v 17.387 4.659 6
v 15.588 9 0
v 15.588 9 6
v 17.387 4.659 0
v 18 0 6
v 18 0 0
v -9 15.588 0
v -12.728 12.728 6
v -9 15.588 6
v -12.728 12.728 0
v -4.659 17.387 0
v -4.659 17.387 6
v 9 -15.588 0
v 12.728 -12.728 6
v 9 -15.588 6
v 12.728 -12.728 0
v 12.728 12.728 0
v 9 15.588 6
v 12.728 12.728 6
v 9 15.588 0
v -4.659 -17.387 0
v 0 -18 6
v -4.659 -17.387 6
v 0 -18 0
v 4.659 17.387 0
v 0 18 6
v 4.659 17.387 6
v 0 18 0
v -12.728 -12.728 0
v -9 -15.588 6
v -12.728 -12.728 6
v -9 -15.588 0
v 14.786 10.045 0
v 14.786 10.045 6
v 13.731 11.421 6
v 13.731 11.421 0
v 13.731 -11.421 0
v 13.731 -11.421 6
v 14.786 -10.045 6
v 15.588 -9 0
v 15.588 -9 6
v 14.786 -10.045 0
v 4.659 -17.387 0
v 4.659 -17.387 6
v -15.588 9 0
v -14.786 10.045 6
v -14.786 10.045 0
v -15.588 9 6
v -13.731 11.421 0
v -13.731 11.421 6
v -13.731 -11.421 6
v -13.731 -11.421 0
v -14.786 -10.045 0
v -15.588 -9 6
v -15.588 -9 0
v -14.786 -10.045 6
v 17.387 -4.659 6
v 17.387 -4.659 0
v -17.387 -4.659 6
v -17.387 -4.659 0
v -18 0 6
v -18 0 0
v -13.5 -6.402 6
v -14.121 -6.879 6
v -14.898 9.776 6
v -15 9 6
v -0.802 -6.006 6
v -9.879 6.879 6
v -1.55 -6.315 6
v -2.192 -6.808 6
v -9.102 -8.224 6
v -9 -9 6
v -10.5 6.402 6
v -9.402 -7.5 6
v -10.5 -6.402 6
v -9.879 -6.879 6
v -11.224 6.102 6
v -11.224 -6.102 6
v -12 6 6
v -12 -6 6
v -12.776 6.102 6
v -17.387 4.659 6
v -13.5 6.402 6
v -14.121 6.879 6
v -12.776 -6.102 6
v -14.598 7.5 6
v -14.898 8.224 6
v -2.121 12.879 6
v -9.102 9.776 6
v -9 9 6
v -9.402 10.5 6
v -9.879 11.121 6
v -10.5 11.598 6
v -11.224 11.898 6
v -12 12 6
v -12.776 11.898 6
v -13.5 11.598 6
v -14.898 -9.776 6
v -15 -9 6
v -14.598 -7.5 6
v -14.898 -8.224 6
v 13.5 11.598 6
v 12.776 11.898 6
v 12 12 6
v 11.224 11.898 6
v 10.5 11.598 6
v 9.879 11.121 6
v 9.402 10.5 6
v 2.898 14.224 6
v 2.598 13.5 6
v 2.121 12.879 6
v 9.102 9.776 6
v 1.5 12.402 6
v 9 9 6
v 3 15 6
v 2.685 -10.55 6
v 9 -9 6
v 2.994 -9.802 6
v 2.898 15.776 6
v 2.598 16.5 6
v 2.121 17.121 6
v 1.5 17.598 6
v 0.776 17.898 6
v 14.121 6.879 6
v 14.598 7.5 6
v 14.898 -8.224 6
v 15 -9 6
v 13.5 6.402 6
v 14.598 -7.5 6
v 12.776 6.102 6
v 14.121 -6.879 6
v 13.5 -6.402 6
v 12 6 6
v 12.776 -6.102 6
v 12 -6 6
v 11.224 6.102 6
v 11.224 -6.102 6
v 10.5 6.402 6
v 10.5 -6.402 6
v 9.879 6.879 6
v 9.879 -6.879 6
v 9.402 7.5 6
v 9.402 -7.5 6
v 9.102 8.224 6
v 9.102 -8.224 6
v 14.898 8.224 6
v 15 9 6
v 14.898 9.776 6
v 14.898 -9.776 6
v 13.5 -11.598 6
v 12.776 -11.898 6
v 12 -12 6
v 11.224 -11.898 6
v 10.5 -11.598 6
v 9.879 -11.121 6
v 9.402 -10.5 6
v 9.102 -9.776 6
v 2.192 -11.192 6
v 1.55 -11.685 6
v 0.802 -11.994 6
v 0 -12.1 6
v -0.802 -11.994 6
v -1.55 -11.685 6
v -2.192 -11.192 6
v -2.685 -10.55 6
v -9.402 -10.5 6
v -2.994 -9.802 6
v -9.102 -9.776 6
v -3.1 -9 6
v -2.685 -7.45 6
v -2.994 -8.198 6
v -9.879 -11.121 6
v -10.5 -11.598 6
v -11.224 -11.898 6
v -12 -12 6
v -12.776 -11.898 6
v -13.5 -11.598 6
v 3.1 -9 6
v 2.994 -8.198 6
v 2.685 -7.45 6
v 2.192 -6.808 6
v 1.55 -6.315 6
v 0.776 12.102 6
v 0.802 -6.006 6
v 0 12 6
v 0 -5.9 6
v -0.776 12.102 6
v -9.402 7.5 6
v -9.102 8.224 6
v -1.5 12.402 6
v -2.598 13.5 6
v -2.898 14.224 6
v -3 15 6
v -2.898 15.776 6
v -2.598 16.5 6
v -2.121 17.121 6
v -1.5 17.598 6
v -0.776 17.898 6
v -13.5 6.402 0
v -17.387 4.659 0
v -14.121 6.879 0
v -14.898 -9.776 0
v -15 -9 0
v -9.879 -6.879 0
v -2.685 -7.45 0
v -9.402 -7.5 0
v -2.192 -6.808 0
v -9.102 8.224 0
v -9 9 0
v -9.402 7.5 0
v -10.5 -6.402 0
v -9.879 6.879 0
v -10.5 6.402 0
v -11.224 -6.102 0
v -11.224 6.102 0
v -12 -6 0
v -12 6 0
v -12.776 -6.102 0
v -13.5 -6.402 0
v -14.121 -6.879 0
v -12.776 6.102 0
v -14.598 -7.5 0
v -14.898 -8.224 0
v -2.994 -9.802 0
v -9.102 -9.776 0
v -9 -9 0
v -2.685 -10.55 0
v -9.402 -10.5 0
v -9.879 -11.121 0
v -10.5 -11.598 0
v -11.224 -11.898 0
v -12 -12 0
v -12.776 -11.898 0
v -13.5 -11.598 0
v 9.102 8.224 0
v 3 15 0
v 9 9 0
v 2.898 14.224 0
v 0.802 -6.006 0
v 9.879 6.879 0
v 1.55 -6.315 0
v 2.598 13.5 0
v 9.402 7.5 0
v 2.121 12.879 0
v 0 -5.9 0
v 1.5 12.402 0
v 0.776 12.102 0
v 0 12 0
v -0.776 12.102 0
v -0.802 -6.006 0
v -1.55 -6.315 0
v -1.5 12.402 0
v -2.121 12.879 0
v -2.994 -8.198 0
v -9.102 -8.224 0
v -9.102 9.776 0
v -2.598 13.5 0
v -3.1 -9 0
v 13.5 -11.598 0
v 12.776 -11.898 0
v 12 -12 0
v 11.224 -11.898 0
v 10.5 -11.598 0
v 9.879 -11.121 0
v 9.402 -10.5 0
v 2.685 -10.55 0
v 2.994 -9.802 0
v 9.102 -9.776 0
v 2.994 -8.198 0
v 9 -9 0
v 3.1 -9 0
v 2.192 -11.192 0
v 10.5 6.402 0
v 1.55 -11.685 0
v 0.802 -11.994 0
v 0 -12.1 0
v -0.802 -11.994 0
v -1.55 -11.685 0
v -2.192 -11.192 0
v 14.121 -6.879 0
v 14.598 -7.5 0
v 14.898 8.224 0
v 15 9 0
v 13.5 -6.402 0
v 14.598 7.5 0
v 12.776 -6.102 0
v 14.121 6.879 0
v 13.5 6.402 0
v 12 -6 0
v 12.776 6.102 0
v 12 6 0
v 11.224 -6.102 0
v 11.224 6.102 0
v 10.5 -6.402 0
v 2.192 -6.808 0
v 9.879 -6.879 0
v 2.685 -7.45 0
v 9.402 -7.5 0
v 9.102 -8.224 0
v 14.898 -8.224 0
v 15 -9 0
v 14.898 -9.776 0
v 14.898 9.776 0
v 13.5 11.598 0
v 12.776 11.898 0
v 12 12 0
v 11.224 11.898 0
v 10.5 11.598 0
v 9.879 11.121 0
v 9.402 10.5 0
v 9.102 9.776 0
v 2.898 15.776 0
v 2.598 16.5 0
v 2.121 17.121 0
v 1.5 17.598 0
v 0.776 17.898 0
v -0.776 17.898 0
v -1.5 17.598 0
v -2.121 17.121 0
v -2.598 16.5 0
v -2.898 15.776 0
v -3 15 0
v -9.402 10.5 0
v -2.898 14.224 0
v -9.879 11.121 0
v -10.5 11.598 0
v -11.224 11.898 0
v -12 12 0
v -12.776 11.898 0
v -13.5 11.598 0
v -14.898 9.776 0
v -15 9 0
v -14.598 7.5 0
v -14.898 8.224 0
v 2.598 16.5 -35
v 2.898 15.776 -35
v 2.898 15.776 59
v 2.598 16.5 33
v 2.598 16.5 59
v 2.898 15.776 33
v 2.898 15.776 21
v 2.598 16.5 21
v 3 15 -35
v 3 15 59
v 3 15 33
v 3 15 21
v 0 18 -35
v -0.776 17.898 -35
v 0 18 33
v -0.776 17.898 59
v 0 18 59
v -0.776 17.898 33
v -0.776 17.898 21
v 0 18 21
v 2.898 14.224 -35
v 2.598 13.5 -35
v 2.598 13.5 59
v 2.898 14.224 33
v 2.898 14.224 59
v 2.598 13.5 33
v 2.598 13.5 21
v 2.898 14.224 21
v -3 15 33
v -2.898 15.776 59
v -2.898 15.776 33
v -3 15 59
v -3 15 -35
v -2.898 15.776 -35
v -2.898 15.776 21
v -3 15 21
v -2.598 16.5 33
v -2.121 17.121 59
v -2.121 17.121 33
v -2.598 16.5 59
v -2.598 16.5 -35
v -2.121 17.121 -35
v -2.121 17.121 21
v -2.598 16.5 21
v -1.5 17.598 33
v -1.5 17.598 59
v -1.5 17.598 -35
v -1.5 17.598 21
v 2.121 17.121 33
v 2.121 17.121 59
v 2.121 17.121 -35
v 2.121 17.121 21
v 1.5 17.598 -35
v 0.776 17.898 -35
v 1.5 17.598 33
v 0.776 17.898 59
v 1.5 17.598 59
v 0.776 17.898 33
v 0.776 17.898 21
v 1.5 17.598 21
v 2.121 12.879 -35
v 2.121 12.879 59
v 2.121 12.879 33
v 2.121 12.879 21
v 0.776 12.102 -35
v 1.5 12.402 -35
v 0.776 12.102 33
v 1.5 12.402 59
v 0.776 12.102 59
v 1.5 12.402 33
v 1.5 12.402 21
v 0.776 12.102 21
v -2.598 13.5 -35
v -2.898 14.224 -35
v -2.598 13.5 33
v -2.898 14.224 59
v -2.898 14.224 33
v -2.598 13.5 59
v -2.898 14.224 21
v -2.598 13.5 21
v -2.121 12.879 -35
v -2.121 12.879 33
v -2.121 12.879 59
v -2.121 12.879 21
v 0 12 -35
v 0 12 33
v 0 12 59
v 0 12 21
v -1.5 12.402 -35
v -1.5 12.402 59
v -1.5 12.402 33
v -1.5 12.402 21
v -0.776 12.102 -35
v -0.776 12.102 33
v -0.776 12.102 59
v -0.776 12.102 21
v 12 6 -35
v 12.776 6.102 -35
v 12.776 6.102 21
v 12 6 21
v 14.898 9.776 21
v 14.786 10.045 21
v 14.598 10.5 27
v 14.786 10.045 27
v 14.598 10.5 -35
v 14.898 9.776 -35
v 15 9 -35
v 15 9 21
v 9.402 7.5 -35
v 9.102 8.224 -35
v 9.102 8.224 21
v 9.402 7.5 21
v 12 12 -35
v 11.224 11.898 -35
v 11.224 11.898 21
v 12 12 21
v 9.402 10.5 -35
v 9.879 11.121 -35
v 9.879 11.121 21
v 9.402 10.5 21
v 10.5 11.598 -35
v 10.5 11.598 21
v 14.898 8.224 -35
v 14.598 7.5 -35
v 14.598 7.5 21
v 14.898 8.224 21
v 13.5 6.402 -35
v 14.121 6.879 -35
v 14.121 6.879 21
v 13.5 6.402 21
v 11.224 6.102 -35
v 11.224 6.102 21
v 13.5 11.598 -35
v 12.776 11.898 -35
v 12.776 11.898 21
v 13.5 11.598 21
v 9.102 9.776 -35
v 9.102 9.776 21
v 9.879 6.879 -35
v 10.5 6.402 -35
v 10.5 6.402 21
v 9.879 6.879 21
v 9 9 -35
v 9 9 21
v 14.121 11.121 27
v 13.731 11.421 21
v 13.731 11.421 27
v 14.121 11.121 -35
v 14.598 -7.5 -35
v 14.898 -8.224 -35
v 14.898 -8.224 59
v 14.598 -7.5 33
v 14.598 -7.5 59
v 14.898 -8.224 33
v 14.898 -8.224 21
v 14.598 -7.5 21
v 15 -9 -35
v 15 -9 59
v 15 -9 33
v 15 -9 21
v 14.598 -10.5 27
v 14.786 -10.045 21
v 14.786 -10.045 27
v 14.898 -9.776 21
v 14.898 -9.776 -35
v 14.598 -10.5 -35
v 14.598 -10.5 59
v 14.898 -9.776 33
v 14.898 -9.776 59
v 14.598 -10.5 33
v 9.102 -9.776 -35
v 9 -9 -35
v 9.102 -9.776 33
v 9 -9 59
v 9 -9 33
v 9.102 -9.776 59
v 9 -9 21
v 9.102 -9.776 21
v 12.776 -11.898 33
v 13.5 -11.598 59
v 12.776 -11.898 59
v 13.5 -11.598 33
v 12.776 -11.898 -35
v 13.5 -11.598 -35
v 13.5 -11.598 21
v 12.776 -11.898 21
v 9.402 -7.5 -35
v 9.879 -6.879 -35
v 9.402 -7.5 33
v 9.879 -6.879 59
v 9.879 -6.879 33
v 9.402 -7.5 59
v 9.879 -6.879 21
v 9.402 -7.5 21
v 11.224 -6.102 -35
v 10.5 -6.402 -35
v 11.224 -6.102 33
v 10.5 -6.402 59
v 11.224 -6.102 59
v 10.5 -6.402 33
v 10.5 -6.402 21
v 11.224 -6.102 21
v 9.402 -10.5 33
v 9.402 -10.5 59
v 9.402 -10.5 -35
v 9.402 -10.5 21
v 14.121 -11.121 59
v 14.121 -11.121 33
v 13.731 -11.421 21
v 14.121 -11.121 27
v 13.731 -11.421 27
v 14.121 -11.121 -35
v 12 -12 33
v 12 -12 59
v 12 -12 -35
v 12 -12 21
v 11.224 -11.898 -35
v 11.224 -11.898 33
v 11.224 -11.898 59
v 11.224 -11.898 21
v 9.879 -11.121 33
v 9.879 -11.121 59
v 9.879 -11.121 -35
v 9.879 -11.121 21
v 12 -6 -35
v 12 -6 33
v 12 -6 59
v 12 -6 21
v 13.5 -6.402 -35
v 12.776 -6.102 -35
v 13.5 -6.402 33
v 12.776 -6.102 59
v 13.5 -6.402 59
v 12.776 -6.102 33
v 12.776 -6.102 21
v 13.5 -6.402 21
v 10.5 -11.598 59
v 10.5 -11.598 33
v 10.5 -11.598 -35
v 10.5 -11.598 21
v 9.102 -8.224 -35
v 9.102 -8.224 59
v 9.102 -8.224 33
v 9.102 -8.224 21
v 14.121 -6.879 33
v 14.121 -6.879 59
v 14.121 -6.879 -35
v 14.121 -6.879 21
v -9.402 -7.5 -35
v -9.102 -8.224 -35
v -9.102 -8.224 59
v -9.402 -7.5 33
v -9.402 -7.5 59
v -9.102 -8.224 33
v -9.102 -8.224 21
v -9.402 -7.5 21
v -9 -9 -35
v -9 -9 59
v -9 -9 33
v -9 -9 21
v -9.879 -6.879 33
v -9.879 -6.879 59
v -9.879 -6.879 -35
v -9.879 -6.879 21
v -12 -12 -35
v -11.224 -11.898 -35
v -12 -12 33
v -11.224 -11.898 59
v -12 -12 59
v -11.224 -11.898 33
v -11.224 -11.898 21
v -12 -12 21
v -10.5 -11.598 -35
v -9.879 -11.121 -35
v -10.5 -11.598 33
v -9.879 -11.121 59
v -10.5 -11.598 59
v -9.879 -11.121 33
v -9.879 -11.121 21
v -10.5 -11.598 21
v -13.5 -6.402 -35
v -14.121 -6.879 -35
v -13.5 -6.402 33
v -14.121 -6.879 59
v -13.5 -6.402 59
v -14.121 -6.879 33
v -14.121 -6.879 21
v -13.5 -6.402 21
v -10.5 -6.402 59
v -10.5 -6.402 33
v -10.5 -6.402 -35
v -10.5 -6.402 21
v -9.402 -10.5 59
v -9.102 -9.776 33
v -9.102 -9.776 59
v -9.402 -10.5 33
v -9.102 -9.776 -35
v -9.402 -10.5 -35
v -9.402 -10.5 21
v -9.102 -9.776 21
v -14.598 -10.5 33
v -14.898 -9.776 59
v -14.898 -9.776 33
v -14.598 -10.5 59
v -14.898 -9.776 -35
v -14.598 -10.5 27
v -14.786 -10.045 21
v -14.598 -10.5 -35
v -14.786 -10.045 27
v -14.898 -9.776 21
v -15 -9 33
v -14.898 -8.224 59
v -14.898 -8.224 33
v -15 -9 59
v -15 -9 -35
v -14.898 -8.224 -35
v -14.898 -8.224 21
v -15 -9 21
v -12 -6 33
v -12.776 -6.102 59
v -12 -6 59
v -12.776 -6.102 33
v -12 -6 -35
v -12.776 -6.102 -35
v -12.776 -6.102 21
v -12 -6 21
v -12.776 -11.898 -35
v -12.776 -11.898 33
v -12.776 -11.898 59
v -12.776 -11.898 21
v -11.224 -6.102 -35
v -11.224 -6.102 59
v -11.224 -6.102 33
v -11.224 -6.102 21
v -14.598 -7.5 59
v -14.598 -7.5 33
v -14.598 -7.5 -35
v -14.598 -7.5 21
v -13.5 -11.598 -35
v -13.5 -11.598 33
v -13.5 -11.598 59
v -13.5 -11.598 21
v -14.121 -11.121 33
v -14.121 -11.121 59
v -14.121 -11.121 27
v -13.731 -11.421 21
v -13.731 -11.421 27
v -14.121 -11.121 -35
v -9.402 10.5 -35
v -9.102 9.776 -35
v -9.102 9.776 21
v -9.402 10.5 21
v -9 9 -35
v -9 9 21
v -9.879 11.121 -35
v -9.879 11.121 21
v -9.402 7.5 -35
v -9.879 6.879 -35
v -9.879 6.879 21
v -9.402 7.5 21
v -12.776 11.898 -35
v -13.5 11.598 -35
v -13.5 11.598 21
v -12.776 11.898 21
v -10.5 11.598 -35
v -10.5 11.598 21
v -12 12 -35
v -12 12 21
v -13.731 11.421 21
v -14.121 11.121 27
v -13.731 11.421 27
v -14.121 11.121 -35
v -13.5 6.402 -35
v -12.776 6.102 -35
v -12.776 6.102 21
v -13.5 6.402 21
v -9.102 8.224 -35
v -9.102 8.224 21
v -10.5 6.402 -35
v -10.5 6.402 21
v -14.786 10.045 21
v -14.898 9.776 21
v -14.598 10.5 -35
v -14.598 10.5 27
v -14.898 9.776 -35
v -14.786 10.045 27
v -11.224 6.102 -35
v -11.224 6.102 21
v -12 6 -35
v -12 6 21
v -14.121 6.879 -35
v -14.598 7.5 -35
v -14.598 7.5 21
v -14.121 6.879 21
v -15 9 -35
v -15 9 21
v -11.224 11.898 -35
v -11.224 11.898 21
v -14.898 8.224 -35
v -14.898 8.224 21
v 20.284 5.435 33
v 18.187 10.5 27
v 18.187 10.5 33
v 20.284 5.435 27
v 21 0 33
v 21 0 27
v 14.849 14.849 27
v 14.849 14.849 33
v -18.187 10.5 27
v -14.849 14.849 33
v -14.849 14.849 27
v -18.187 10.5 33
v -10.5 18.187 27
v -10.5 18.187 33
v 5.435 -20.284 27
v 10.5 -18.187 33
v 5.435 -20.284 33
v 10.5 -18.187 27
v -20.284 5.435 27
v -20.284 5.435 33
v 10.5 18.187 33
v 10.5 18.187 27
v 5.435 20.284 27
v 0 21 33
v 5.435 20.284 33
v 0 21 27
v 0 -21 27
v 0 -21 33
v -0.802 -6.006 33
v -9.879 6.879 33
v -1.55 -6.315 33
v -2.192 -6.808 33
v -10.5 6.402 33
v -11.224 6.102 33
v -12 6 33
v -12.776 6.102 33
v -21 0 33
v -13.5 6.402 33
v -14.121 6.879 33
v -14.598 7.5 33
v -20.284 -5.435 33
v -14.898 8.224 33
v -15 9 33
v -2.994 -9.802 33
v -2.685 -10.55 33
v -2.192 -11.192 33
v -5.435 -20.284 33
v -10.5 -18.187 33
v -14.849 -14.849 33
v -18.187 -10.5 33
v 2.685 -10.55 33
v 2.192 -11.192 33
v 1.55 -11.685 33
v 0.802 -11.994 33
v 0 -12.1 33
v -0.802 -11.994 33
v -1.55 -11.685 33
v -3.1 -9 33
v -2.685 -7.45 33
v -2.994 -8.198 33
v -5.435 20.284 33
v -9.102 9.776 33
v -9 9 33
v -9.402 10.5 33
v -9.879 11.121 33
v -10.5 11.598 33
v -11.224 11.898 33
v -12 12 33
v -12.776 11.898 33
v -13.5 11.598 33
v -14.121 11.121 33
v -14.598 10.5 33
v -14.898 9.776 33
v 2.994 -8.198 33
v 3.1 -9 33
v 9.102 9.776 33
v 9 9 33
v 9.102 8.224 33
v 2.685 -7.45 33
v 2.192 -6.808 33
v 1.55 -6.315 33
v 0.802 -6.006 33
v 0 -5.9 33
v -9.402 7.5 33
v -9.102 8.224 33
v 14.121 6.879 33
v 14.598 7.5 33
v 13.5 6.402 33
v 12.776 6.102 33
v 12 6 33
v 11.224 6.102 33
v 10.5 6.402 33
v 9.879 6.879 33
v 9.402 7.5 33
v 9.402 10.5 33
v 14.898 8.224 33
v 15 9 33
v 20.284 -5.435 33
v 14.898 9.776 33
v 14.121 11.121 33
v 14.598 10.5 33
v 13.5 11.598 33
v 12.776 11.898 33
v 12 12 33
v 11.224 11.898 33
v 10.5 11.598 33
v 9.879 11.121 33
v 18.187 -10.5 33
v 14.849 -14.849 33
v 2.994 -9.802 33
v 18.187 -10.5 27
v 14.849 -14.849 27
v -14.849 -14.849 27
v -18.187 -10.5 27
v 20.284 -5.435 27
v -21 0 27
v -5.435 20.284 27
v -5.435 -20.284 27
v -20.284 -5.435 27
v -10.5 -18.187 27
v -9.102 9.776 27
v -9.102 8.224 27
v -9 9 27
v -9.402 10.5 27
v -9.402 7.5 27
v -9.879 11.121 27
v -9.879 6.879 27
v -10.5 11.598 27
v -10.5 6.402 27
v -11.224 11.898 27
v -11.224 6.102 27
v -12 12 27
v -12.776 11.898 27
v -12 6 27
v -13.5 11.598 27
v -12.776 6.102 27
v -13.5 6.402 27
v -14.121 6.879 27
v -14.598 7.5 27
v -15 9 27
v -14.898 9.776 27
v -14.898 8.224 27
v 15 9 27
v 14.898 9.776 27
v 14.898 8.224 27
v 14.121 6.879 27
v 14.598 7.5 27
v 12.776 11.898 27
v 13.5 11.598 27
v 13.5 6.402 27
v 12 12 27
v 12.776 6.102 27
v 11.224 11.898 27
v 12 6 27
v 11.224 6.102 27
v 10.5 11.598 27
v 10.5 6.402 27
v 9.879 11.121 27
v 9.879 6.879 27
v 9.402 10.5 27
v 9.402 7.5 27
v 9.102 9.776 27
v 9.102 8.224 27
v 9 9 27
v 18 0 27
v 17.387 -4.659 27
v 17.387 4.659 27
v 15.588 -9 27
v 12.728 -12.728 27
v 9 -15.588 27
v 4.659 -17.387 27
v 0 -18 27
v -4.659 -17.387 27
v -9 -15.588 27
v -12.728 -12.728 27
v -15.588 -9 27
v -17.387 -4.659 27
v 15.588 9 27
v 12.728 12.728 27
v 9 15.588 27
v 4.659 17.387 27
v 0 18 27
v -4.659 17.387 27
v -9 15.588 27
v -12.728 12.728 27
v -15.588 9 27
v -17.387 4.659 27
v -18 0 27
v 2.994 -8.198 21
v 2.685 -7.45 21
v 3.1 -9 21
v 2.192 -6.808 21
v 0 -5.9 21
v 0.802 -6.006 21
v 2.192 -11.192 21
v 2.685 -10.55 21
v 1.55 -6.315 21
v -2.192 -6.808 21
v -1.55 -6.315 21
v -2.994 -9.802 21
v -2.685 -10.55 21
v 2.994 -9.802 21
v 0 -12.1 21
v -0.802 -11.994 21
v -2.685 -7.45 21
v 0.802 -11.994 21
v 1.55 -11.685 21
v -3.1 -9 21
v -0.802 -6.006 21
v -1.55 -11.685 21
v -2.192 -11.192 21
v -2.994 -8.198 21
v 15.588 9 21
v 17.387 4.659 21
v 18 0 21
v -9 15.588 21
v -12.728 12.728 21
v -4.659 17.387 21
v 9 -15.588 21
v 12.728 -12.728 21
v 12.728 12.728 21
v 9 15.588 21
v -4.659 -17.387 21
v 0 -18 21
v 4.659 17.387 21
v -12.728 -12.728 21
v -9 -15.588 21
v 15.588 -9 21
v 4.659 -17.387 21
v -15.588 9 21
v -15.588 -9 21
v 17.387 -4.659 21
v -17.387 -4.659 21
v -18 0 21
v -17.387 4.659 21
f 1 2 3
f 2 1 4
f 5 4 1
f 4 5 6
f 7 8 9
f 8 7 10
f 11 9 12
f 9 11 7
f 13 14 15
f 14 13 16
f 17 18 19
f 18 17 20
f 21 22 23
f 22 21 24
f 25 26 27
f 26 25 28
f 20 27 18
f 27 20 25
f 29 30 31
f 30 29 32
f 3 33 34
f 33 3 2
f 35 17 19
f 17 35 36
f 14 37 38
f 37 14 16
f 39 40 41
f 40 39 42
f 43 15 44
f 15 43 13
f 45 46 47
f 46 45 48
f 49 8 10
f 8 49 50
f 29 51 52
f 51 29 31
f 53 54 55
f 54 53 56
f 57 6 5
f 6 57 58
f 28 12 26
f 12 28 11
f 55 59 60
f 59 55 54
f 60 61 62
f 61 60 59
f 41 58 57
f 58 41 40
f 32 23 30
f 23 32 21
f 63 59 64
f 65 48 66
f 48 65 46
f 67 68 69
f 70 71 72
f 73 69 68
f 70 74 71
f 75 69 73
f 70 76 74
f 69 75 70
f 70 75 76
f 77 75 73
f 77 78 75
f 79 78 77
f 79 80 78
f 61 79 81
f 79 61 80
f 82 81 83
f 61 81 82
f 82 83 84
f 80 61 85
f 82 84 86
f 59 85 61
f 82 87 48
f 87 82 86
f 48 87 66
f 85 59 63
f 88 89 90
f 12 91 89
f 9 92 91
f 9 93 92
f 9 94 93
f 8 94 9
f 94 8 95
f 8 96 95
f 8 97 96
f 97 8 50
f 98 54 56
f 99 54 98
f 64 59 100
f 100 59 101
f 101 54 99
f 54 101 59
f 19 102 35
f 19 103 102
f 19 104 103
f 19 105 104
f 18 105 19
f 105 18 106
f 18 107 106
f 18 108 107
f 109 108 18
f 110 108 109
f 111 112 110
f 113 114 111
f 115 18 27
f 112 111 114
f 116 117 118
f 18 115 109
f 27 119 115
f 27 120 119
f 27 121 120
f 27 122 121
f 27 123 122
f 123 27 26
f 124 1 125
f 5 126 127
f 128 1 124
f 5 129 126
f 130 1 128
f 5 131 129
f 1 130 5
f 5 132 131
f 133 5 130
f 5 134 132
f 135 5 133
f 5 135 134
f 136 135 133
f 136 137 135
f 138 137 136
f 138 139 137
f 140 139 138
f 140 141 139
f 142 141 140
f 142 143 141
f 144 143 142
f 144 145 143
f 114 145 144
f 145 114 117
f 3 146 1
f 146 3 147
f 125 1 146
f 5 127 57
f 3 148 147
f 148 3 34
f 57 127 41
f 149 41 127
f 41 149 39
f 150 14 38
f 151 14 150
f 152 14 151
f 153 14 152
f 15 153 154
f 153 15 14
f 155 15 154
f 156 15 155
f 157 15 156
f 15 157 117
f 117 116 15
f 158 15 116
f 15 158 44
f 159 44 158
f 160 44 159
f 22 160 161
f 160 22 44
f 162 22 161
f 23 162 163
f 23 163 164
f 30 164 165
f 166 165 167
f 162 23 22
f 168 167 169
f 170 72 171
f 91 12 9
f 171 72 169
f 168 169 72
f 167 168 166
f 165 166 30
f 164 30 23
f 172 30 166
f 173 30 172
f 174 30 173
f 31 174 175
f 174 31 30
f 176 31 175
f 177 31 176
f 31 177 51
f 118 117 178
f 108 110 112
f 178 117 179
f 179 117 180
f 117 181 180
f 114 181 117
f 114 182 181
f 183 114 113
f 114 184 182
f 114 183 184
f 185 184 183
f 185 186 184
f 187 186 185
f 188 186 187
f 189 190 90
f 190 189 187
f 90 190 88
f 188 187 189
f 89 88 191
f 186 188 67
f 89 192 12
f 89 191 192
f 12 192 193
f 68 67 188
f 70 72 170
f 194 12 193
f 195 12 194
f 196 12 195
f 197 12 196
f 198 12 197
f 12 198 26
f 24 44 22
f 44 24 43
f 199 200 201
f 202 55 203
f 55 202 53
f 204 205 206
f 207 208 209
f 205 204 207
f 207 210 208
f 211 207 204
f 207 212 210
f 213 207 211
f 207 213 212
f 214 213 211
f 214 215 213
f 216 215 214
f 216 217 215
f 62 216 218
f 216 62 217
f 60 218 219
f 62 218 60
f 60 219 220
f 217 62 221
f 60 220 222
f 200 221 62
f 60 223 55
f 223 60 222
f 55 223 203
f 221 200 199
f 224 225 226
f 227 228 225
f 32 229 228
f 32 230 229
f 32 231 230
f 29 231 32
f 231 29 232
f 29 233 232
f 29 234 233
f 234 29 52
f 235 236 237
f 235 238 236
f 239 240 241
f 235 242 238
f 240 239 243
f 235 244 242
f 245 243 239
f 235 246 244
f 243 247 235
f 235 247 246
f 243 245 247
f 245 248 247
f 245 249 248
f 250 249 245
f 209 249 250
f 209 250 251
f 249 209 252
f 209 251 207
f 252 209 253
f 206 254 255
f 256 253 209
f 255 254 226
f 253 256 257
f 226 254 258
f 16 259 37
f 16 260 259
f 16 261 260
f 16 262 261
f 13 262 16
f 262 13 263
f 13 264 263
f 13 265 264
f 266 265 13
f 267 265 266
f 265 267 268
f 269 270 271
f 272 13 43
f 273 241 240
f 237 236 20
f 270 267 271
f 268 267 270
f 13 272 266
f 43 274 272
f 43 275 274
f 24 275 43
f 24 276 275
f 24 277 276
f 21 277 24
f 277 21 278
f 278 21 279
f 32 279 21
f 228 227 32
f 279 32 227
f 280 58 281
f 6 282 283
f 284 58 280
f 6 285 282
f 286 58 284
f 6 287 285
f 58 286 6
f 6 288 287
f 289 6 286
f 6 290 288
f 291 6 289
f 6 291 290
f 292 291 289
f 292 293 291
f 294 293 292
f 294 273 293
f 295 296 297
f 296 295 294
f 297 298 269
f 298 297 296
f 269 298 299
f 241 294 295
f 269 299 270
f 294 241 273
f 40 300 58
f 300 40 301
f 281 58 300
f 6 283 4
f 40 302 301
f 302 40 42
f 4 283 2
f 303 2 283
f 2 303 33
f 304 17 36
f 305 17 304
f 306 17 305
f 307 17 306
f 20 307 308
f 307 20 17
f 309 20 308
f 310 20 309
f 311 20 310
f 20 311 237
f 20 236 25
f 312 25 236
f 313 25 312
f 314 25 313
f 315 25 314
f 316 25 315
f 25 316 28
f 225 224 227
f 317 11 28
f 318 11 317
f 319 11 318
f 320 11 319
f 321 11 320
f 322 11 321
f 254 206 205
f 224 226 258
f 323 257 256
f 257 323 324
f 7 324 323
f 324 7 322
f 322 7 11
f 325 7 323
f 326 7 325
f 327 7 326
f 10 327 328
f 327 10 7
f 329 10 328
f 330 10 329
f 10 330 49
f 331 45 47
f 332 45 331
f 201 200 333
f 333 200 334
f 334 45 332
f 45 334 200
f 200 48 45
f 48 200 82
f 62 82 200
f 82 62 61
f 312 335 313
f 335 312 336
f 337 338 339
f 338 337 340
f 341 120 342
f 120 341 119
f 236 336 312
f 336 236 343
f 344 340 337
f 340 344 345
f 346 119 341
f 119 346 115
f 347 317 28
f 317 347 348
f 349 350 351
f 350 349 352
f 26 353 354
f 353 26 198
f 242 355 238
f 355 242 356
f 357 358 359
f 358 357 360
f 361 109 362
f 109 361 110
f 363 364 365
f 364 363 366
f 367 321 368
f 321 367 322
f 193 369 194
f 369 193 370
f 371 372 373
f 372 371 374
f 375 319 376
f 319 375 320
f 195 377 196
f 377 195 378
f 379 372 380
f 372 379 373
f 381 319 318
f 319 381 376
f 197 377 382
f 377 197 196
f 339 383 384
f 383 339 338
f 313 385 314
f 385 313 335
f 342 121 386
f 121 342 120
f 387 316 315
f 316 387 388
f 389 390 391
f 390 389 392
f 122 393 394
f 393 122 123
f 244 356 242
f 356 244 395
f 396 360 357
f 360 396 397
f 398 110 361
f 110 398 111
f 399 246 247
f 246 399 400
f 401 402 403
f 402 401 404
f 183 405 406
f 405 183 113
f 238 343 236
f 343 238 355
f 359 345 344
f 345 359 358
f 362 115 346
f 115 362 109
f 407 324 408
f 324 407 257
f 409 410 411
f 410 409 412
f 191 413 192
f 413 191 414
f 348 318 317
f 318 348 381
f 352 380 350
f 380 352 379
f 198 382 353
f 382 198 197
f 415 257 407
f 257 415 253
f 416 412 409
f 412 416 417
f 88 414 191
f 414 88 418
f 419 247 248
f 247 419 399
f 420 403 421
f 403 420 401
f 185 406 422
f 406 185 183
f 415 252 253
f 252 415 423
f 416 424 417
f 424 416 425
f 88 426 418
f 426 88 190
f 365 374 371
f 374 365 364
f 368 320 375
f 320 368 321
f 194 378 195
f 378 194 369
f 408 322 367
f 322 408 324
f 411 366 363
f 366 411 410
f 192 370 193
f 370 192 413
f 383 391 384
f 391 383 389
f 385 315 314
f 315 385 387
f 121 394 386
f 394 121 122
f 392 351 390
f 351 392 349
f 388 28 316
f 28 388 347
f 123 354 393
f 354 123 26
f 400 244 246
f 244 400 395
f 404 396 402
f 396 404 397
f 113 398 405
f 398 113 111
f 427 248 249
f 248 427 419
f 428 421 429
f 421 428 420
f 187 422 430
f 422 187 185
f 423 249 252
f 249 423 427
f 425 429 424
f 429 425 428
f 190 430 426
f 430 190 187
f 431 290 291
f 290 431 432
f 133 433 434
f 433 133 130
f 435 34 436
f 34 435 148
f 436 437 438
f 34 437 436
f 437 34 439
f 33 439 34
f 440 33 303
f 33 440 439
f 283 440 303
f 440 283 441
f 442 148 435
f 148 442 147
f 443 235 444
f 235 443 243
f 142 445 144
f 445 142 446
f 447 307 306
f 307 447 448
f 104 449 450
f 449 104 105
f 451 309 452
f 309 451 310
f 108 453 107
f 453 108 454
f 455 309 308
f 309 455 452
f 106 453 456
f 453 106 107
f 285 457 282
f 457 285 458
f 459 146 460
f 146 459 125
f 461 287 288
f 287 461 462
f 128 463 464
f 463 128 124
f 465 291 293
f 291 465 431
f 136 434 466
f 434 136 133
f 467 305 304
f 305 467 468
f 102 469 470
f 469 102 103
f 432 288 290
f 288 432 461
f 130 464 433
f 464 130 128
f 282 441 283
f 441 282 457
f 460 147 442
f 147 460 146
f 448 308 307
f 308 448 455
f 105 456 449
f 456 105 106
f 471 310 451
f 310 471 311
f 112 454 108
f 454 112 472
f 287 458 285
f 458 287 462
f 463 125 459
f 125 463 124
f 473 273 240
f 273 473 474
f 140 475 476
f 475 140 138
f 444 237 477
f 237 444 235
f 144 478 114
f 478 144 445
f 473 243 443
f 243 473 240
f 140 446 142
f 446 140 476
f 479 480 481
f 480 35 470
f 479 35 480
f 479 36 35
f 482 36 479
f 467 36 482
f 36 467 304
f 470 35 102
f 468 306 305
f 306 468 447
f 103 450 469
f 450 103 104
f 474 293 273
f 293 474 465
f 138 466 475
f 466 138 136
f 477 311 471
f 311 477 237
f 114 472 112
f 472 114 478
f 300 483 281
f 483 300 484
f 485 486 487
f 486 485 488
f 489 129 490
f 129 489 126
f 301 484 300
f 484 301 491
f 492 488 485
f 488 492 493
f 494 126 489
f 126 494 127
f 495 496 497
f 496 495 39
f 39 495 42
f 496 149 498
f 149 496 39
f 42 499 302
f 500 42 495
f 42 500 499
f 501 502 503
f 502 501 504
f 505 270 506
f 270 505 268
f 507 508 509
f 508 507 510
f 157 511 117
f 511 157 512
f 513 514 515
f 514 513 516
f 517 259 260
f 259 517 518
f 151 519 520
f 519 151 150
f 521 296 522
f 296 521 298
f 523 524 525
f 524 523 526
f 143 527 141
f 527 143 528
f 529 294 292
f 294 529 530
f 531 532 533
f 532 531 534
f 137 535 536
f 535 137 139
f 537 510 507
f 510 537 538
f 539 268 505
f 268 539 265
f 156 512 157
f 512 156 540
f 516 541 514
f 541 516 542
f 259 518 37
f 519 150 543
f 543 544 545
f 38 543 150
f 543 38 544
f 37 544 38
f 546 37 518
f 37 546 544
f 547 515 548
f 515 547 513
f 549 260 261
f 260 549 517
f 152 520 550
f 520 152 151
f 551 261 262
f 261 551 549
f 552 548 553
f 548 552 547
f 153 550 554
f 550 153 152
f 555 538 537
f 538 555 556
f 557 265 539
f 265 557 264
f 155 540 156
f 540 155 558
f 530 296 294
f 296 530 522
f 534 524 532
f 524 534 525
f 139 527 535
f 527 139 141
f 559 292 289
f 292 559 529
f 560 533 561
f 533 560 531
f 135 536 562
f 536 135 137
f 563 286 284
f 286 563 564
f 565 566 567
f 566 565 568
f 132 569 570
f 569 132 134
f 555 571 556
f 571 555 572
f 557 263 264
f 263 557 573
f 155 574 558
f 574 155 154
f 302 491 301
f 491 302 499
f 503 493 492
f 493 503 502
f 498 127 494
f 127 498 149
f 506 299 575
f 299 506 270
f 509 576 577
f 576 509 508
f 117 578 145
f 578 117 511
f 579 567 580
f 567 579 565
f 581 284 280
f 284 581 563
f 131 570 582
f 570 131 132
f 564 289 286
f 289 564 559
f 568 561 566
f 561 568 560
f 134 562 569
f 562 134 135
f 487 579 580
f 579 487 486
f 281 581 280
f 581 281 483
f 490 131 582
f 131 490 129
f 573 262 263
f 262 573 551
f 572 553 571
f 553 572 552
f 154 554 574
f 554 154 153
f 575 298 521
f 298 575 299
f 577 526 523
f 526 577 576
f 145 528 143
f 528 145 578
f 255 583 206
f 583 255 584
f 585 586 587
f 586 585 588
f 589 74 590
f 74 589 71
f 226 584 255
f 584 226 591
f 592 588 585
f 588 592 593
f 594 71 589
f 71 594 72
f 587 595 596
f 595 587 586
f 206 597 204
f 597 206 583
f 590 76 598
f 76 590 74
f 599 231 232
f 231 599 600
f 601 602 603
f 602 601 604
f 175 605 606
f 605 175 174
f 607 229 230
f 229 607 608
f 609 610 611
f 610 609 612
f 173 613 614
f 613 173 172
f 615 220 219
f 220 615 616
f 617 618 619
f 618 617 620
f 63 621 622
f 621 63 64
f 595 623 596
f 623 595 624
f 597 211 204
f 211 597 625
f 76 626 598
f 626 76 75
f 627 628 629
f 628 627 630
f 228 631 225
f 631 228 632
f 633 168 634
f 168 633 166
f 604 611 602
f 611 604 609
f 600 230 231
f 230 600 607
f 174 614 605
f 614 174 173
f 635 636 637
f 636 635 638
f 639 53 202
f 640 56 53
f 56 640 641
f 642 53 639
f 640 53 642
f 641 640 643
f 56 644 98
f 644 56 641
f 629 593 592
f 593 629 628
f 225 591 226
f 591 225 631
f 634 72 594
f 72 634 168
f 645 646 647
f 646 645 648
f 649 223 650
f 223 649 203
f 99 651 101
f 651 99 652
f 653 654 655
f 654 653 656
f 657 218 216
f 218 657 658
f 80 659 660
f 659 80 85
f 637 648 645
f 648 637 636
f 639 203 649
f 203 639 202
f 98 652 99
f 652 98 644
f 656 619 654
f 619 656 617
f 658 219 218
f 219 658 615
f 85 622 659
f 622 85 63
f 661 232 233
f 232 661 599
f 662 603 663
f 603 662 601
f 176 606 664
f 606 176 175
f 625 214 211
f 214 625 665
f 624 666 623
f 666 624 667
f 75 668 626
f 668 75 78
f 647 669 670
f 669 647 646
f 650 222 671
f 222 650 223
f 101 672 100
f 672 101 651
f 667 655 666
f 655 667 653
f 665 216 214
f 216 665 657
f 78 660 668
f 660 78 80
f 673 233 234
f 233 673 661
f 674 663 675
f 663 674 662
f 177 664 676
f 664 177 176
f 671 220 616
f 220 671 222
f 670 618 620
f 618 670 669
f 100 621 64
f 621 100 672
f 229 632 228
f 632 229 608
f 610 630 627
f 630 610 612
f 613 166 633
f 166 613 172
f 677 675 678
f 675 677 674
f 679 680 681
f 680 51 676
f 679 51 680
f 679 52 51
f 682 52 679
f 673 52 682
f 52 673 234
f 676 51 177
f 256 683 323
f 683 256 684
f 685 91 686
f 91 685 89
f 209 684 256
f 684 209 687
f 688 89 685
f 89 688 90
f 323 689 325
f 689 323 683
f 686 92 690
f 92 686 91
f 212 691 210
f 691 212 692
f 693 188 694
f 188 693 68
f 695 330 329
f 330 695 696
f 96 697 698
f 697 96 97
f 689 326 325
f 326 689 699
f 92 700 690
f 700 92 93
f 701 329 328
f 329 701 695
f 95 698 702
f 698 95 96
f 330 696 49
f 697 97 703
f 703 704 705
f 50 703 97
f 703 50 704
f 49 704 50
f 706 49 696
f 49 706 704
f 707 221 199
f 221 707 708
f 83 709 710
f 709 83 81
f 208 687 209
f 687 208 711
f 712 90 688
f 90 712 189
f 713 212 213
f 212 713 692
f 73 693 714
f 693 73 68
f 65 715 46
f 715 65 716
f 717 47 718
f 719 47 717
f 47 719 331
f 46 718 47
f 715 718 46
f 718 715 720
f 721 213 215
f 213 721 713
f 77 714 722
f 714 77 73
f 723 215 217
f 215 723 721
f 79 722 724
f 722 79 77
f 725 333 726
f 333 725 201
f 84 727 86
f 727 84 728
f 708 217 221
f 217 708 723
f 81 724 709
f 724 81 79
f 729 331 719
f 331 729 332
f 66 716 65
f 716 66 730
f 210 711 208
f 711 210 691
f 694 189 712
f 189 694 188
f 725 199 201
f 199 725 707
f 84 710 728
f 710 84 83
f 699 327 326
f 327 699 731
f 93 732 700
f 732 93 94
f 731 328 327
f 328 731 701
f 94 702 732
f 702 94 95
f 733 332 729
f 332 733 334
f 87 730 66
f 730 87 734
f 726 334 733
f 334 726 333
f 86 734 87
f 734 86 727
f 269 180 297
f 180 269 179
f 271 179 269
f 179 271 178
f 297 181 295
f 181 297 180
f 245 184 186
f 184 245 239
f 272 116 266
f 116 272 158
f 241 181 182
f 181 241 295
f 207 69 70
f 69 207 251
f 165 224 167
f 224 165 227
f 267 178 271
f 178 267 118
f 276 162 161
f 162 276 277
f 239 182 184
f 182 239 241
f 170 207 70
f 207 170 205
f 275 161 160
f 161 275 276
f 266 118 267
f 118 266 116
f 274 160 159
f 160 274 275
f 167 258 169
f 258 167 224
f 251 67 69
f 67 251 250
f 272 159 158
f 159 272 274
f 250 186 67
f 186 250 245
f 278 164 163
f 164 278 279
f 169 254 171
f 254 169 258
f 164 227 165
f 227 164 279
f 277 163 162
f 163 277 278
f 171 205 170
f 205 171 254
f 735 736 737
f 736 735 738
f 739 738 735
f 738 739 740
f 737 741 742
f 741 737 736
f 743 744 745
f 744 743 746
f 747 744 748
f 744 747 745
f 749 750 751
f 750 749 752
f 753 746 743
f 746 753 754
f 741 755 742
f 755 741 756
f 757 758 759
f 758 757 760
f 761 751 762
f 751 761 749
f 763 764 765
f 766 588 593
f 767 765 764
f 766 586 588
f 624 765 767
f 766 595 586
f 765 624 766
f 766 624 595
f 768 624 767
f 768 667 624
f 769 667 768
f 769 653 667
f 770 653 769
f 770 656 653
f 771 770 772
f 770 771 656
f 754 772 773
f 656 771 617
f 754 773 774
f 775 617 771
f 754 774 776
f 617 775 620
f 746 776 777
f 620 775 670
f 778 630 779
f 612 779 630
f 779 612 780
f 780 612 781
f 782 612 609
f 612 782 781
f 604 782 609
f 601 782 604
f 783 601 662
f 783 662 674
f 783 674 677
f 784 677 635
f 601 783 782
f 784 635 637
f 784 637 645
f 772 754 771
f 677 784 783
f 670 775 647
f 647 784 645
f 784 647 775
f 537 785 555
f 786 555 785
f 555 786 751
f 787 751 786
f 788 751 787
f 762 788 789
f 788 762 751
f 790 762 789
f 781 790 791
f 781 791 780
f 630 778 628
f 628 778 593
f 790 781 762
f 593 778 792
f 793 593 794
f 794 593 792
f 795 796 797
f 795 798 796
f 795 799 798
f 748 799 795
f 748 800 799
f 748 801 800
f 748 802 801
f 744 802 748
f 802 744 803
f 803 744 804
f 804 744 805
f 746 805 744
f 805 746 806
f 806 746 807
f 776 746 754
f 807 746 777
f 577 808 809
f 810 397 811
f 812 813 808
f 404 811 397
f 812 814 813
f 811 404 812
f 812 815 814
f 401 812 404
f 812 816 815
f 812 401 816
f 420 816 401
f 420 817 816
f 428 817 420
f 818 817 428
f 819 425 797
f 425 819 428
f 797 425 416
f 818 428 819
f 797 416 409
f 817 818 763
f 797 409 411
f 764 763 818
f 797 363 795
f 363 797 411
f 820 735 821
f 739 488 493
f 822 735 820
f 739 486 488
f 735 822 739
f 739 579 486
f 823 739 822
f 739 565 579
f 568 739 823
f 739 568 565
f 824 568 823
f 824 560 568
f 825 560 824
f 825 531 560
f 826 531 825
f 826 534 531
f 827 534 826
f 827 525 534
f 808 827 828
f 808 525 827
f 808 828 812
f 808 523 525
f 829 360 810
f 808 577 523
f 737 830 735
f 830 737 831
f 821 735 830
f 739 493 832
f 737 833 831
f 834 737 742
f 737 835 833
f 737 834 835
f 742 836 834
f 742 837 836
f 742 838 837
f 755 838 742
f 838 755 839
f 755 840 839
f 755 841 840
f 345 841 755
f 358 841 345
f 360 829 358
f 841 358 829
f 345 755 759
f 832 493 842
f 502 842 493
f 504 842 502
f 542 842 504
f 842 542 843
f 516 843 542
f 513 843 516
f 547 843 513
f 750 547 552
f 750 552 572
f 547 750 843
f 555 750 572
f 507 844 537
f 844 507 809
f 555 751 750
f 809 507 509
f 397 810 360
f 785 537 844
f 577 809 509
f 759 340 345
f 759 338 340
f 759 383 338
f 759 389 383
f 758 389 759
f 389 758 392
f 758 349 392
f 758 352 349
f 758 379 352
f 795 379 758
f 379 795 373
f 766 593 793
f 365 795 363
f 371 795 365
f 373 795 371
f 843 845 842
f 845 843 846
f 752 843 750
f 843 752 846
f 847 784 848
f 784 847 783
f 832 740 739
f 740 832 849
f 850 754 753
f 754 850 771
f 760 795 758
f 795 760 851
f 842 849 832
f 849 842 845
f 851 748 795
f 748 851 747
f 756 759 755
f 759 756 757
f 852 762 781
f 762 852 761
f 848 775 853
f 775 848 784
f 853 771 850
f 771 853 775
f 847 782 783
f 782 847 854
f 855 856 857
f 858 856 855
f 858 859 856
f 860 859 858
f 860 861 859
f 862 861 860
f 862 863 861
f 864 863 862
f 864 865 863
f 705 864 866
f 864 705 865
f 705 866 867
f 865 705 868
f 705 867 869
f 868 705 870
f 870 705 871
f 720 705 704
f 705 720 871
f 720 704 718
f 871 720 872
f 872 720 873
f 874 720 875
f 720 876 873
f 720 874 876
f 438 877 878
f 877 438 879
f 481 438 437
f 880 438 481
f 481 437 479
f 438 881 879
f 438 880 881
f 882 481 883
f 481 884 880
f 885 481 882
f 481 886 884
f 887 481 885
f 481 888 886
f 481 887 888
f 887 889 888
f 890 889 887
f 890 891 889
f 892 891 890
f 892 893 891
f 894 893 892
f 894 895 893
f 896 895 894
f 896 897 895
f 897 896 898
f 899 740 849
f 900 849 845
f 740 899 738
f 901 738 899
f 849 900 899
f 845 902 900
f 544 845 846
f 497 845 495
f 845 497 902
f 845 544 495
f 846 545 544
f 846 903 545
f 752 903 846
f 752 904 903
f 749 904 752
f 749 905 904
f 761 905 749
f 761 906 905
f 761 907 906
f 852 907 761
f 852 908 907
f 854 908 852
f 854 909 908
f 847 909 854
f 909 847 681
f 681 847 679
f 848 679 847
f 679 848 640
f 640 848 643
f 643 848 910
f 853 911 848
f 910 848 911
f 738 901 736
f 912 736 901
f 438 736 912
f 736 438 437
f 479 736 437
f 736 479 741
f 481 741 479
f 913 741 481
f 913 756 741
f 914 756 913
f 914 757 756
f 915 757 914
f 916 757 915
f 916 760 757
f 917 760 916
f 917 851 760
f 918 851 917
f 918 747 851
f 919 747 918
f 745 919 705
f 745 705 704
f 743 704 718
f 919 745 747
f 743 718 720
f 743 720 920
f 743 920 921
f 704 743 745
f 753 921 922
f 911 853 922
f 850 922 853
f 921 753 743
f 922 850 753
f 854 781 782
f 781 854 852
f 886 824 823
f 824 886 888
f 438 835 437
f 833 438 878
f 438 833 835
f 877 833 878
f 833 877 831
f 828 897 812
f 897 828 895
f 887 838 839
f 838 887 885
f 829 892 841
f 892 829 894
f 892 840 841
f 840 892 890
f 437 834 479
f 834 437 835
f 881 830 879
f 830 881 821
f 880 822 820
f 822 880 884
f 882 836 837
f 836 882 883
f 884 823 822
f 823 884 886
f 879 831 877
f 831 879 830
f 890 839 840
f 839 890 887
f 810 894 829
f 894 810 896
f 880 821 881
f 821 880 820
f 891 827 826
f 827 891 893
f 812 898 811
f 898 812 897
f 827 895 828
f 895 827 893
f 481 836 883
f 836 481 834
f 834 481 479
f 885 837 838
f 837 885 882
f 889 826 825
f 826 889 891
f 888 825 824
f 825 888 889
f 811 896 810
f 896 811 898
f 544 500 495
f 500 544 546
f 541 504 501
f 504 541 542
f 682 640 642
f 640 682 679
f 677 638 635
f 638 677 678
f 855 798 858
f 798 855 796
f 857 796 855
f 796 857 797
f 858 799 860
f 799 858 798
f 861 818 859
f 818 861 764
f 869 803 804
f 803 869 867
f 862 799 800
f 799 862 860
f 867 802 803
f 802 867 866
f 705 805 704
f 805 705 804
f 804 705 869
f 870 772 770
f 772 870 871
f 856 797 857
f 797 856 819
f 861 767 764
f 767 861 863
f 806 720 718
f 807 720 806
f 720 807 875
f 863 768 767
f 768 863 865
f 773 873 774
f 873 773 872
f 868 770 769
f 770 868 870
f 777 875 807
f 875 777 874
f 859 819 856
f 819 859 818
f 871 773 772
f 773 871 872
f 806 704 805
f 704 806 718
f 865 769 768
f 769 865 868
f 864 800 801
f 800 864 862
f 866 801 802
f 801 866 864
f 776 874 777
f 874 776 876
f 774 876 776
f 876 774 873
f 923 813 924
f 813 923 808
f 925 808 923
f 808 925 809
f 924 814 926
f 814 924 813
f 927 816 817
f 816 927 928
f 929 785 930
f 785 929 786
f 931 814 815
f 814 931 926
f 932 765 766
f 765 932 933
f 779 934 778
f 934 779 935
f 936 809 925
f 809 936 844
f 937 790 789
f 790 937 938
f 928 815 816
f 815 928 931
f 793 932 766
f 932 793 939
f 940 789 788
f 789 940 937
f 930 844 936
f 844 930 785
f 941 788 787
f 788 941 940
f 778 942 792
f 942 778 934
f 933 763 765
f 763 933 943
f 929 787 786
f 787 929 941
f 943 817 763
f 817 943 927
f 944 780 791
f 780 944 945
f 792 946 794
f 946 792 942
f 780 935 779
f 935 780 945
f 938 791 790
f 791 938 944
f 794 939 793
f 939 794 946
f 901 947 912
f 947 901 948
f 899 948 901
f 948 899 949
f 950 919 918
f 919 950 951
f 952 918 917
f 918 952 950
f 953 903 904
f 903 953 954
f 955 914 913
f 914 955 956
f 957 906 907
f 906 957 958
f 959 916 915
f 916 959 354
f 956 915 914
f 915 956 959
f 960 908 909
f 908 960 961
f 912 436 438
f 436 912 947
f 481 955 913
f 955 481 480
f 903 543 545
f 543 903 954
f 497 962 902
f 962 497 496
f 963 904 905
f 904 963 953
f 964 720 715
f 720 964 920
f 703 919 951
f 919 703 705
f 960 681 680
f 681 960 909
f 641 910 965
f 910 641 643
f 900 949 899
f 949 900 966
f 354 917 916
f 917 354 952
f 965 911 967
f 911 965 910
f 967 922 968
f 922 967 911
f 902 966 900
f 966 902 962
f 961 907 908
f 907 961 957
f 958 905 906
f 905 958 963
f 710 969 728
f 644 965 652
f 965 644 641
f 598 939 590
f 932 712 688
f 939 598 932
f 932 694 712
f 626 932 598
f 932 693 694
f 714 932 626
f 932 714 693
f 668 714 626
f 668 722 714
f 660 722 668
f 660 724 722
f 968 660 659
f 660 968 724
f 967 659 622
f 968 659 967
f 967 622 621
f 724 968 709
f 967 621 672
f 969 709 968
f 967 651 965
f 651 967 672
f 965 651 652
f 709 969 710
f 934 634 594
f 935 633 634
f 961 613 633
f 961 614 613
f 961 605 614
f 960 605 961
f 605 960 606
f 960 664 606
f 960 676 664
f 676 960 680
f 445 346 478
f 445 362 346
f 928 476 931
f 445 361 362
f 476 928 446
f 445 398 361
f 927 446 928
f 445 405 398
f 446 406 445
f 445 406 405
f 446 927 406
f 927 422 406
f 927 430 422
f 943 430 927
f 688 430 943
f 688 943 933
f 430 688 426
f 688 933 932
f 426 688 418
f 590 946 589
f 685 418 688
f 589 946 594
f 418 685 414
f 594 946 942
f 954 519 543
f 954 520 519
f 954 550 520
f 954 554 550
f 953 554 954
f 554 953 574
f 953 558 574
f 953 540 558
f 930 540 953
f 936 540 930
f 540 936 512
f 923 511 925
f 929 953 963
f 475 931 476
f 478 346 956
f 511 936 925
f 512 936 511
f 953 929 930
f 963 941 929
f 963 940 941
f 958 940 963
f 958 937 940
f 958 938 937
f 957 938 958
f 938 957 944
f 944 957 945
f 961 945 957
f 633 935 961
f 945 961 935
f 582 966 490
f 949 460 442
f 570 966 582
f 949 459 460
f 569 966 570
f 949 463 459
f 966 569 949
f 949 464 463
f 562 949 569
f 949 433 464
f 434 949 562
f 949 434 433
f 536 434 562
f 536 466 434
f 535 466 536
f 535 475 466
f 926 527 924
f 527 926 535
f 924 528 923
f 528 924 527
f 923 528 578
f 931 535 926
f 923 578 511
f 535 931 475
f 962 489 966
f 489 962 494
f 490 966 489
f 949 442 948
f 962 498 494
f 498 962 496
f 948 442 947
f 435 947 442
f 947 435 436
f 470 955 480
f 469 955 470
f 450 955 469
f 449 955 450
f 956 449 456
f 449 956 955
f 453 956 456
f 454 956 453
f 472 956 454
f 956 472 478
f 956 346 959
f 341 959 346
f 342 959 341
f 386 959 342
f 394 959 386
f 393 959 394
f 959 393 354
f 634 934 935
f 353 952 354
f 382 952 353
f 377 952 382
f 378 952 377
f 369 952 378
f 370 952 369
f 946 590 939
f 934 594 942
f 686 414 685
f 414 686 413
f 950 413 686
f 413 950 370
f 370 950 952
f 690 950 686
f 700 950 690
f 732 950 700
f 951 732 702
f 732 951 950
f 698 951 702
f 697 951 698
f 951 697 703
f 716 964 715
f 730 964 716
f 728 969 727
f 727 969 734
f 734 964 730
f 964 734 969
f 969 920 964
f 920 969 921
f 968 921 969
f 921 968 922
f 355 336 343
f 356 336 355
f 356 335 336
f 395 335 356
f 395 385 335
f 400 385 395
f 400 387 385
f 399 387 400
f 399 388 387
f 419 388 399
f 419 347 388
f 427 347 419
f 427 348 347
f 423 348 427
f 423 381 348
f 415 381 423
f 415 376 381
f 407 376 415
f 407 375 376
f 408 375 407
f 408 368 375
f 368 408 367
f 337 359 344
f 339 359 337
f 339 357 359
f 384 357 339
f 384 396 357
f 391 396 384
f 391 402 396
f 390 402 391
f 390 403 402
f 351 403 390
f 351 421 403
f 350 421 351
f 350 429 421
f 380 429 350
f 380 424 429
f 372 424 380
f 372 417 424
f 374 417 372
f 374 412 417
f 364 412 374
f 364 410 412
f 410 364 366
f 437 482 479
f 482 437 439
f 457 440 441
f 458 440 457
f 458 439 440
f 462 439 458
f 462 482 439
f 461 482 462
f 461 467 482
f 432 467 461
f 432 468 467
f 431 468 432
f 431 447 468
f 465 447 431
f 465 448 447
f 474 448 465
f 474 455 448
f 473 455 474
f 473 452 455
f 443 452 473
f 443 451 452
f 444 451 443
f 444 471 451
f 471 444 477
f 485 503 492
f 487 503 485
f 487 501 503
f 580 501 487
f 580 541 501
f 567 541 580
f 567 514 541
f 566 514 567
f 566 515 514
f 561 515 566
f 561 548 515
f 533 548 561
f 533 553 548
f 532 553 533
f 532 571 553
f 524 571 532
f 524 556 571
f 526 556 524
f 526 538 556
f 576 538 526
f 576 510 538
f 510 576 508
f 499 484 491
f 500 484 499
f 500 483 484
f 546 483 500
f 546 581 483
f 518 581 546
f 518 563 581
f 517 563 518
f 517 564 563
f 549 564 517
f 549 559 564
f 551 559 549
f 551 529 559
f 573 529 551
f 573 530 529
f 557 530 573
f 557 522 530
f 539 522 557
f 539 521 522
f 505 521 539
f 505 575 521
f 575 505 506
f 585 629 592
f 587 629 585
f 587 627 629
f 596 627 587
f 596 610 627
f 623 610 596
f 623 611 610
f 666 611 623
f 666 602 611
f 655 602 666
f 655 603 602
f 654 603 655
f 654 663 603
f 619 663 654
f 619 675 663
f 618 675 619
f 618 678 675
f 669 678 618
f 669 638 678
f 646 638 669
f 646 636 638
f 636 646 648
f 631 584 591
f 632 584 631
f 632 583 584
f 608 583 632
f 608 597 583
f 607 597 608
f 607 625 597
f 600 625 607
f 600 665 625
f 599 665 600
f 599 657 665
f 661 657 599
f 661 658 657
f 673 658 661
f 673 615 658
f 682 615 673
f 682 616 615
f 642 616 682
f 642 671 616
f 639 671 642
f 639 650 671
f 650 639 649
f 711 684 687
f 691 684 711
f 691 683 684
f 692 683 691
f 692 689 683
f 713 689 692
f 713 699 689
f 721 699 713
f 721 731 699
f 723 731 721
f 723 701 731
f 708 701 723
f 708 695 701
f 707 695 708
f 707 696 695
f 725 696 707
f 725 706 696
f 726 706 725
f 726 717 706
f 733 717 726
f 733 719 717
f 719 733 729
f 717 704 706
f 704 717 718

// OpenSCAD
include <../main.scad>
$holeflg = false;
$chamfflg = false;

ASSY_MS();
